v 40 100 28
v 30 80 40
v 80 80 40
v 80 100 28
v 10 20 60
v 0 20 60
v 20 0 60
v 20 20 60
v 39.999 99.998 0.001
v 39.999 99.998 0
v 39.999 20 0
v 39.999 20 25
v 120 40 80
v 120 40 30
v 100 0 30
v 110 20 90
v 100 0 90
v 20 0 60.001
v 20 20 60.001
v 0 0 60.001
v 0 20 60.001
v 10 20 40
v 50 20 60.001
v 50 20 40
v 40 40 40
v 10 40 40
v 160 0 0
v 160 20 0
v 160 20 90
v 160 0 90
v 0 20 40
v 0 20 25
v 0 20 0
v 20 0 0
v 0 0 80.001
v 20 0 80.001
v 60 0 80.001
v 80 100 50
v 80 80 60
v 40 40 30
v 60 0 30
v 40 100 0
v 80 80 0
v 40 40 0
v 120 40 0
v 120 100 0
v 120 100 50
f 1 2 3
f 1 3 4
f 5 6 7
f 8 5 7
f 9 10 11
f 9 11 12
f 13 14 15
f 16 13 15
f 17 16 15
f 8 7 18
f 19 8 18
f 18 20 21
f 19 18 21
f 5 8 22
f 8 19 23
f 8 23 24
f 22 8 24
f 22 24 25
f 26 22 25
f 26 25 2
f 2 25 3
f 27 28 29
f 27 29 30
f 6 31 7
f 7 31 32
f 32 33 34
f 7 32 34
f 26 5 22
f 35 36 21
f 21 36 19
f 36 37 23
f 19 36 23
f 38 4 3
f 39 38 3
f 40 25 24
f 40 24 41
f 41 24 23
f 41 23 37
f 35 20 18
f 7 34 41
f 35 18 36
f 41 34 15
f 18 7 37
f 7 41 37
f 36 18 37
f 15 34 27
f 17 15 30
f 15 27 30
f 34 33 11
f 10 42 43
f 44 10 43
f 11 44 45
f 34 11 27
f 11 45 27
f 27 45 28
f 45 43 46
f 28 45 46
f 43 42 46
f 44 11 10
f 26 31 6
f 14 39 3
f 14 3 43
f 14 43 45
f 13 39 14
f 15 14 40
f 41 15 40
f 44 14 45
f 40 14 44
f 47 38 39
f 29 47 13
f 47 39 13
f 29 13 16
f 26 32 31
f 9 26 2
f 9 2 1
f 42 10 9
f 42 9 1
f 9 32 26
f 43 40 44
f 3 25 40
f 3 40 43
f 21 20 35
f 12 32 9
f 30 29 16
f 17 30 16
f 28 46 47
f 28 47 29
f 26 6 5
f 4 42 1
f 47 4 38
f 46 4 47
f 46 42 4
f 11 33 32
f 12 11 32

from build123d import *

# Parameters (mm, degrees)
BOSS_EXTRUDE1_DEPTH  = 90
CUT_EXTRUDE1_DEPTH   = 251
CUT_EXTRUDE7_DEPTH   = 40
CUT_EXTRUDE8_DEPTH   = 20
SKETCH9_W            = 70
SKETCH9_H            = 10
CUT_EXTRUDE9_DEPTH   = 190
SKETCH10_W           = 39.999
SKETCH10_H           = 29.999
CUT_EXTRUDE13_DEPTH  = 190
CUT_EXTRUDE14_DEPTH  = 190
CUT_EXTRUDE15_DEPTH  = 190
BOSS_EXTRUDE2_DEPTH  = 34
SKETCH14_W           = 39.999
SKETCH14_H           = 20
BOSS_EXTRUDE3_DEPTH  = 34
BOSS_EXTRUDE4_DEPTH  = 34
CUT_EXTRUDE21_DEPTH  = 77
SKETCH21_W           = 43.001
SKETCH21_H           = 20
CUT_EXTRUDE26_DEPTH  = 77
SKETCH22_W           = 28.284271247
SKETCH22_H           = 44.001
CUT_EXTRUDE27_DEPTH  = 77
BOSS_EXTRUDE5_DEPTH  = 77
BOSS_EXTRUDE7_DEPTH  = 50
BOSS_EXTRUDE8_DEPTH  = 50
BOSS_EXTRUDE12_DEPTH = 50
SKETCH32_W           = 44.001
SKETCH32_H           = 44.77461291
CUT_EXTRUDE29_DEPTH  = 2
CUT_EXTRUDE30_DEPTH  = 26
CUT_EXTRUDE33_DEPTH  = 26
CUT_EXTRUDE34_DEPTH  = 26
CUT_EXTRUDE38_DEPTH  = 5
SKETCH39_W           = 17.510737787
SKETCH39_H           = 5.1178381
BOSS_EXTRUDE13_DEPTH = 5
BOSS_EXTRUDE14_DEPTH = 5
SKETCH41_W           = 36.425905646
SKETCH41_H           = 30.361438292
BOSS_EXTRUDE17_DEPTH = 5
SKETCH43_W           = 4
SKETCH43_H           = 20
CUT_EXTRUDE39_DEPTH  = 64
SKETCH44_W           = 50
SKETCH44_H           = 4
CUT_EXTRUDE40_DEPTH  = 64
SKETCH45_W           = 120
SKETCH45_H           = 89.443166314
CUT_EXTRUDE43_DEPTH  = 64
SKETCH47_W           = 22.113315132
SKETCH47_H           = 22.285790595
BOSS_EXTRUDE19_DEPTH = 2
SKETCH48_W           = 120
SKETCH48_H           = 89.4427191
CUT_EXTRUDE44_DEPTH  = 5
CUT_EXTRUDE47_DEPTH  = 5
BOSS_EXTRUDE24_DEPTH = 30
BOSS_EXTRUDE26_DEPTH = 30
SKETCH56_W           = 32.299156512
SKETCH56_H           = 27.21956411
BOSS_EXTRUDE27_DEPTH = 30
SKETCH57_W           = 40.001
SKETCH57_H           = 25.586983612
BOSS_EXTRUDE28_DEPTH = 30
SKETCH61_W           = 48.915417123
SKETCH61_H           = 22.361126989
CUT_EXTRUDE55_DEPTH  = 20
BOSS_EXTRUDE30_DEPTH = 10
CUT_EXTRUDE56_DEPTH  = 79
CUT_EXTRUDE57_DEPTH  = 79
CUT_EXTRUDE58_DEPTH  = 79
CUT_EXTRUDE59_DEPTH  = 10
CUT_EXTRUDE64_DEPTH  = 20
BOSS_EXTRUDE32_DEPTH = 20
CUT_EXTRUDE65_DEPTH  = 49
SKETCH73_W           = 58.518906985
SKETCH73_H           = 24.994806596
CUT_EXTRUDE66_DEPTH  = 49
SKETCH75_W           = 20
SKETCH75_H           = 56.568542508
BOSS_EXTRUDE33_DEPTH = 2
CUT_EXTRUDE69_DEPTH  = 29
CUT_EXTRUDE70_DEPTH  = 29
CUT_EXTRUDE72_DEPTH  = 2
SKETCH81_W           = 8.58676876
SKETCH81_H           = 2.828391771
CUT_EXTRUDE73_DEPTH  = 2
SKETCH82_W           = 29.228045829
SKETCH82_H           = 21.594351677
CUT_EXTRUDE76_DEPTH  = 40
CUT_EXTRUDE77_DEPTH  = 20
CUT_EXTRUDE82_DEPTH  = 40
CUT_EXTRUDE84_DEPTH  = 39.999
CUT_EXTRUDE85_DEPTH  = 0.0001
BOSS_EXTRUDE34_DEPTH = 2
CUT_EXTRUDE86_DEPTH  = 2
CUT_EXTRUDE88_DEPTH  = 56
BOSS_EXTRUDE40_DEPTH = 20
CUT_EXTRUDE89_DEPTH  = 20
BOSS_EXTRUDE41_DEPTH = 50
BOSS_EXTRUDE42_DEPTH = 40
BOSS_EXTRUDE43_DEPTH = 20
SKETCH102_W          = 60.001499975
SKETCH102_H          = 20
CUT_EXTRUDE90_DEPTH  = 20
BOSS_EXTRUDE44_DEPTH = 60
CUT_EXTRUDE91_DEPTH  = 60
CUT_EXTRUDE92_DEPTH  = 60
CUT_EXTRUDE93_DEPTH  = 10
CUT_EXTRUDE96_DEPTH  = 20
CUT_EXTRUDE98_DEPTH  = 20
BOSS_EXTRUDE45_DEPTH = 20
CUT_EXTRUDE99_DEPTH  = 20
CUT_EXTRUDE100_DEPTH = 10
CUT_EXTRUDE101_DEPTH = 142
CUT_EXTRUDE106_DEPTH = 39.999
CUT_EXTRUDE107_DEPTH = 10


with BuildPart() as part:
    # Sketch1 → Boss-Extrude1 (new body)
    with BuildSketch(Plane.XY):
        Polygon((0, 0), (0, 20), (40, 100), (120, 100), (160, 20), (160, 0), align=None)
    extrude(amount=BOSS_EXTRUDE1_DEPTH)

    # Sketch2 → Cut-Extrude1 (cut)
    with BuildSketch(Plane(origin=(0, 0, 0), x_dir=(0, 0, -1), z_dir=(1, 0, 0))):
        Polygon((-90, 100), (-50, 100), (-90, 20), align=None)
    extrude(amount=CUT_EXTRUDE1_DEPTH, mode=Mode.SUBTRACT)

    # Sketch7 → Cut-Extrude7 (cut)
    with BuildSketch(Plane.XY.offset(90)):
        Polygon((60, 0), (100, 0), (120, 40), (80, 80), (40, 40), align=None)
    extrude(amount=-CUT_EXTRUDE7_DEPTH, mode=Mode.SUBTRACT)

    # Sketch8 → Cut-Extrude8 (cut)
    with BuildSketch(Plane.XY.offset(50)):
        Polygon((40, 40), (120, 40), (80, 80), align=None)
    extrude(amount=-CUT_EXTRUDE8_DEPTH, mode=Mode.SUBTRACT)

    # Sketch9 → Cut-Extrude9 (cut)
    with BuildSketch(Plane(origin=(0, 0, 0), x_dir=(1, 0, 0), z_dir=(0, 1, 0))):
        with Locations((75, -85)):
            Rectangle(SKETCH9_W, SKETCH9_H)
    extrude(amount=CUT_EXTRUDE9_DEPTH, mode=Mode.SUBTRACT)

    # Sketch10 → Cut-Extrude13 (cut)
    with BuildSketch(Plane(origin=(0, 0, 0), x_dir=(-1, 0, 0), z_dir=(0, -1, 0))):
        with Locations((-19.9995, -75.0005)):
            Rectangle(SKETCH10_W, SKETCH10_H)
    extrude(amount=-CUT_EXTRUDE13_DEPTH, mode=Mode.SUBTRACT)

    # Sketch11 → Cut-Extrude14 (cut)
    with BuildSketch(Plane(origin=(40, 0, 0), x_dir=(0, 0, -1), z_dir=(1, 0, 0))):
        Polygon((-80, 40), (-80, 0), (-90, 0), (-90, 20), align=None)
    extrude(amount=-CUT_EXTRUDE14_DEPTH, mode=Mode.SUBTRACT)

    # Sketch12 → Cut-Extrude15 (cut)
    with BuildSketch(Plane(origin=(0, 0, 0), x_dir=(-1, 0, 0), z_dir=(0, -1, 0))):
        Polygon((-100, -80), (-100, -70), (-110, -75), (-110, -80), align=None)
        Polygon((-39.999, -80), (-60, -80), (-60, -70), align=None)
    extrude(amount=-CUT_EXTRUDE15_DEPTH, mode=Mode.SUBTRACT)

    # Sketch13 → Boss-Extrude2 (add)
    with BuildSketch(Plane.XY.offset(90)):
        Polygon((110, 20), (110, 0), (100, 0), align=None)
    extrude(amount=-BOSS_EXTRUDE2_DEPTH)

    # Sketch14 → Boss-Extrude3 (add)
    with BuildSketch(Plane.XY.offset(60.001)):
        with Locations((19.9995, 10)):
            Rectangle(SKETCH14_W, SKETCH14_H)
    extrude(amount=BOSS_EXTRUDE3_DEPTH)

    # Sketch15 → Boss-Extrude4 (add)
    with BuildSketch(Plane.XY.offset(94.001)):
        Polygon((39.999, 0), (60, 0), (39.999, 20), align=None)
    extrude(amount=-BOSS_EXTRUDE4_DEPTH)

    # Sketch17 → Cut-Extrude21 (cut)
    with BuildSketch(Plane.XY.offset(50)):
        Polygon((60, 0), (40, 40), (40, 20), align=None)
    extrude(amount=CUT_EXTRUDE21_DEPTH, mode=Mode.SUBTRACT)

    # Sketch21 → Cut-Extrude26 (cut)
    with BuildSketch(Plane(origin=(40, 0, 0), x_dir=(0, 0, -1), z_dir=(1, 0, 0))):
        with Locations((-71.5005, 30)):
            Rectangle(SKETCH21_W, SKETCH21_H)
    extrude(amount=-CUT_EXTRUDE26_DEPTH, mode=Mode.SUBTRACT)

    # Sketch22 → Cut-Extrude27 (cut)
    with BuildSketch(Plane(origin=(30, 30, 0), x_dir=(0.707106781, -0.707106781, 0), z_dir=(0.707106781, 0.707106781, 0))):
        with Locations((28.284271248, -72.0005)):
            Rectangle(SKETCH22_W, SKETCH22_H)
    extrude(amount=-CUT_EXTRUDE27_DEPTH, mode=Mode.SUBTRACT)

    # Sketch23 → Boss-Extrude5 (add)
    with BuildSketch(Plane.XY.offset(94.001)):
        Polygon((39.999, 19.999), (39.999, 0), (49.999, 0), (39.999333333, 19.999333333), align=None)
        Polygon((39.999, 19.999), (20, 0), (39.999, 0), align=None)
    extrude(amount=-BOSS_EXTRUDE5_DEPTH)

    # Sketch26 → Boss-Extrude7 (add)
    with BuildSketch(Plane(origin=(0, 44.338879347, 80.614312123), x_dir=(-1, 0, 0), z_dir=(0, -0.481927159, -0.876211284))):
        Polygon((-40, 63.524770438), (-39.999, -27.777409169), (0, -27.777409169), align=None)
    extrude(amount=BOSS_EXTRUDE7_DEPTH)

    # Sketch28 → Boss-Extrude8 (add)
    with BuildSketch(Plane.XY.offset(94.001)):
        Polygon((0, 0), (60, 0), (50, 20), (0, 20), align=None)
    extrude(amount=-BOSS_EXTRUDE8_DEPTH)

    # Sketch31 → Boss-Extrude12 (add)
    with BuildSketch(Plane.XY.offset(94.001)):
        Polygon((50, 20), (40.001, 40), (39.999, 20), align=None)
    extrude(amount=-BOSS_EXTRUDE12_DEPTH)

    # Sketch32 → Cut-Extrude29 (cut)
    with BuildSketch(Plane(origin=(48, 24, 0), x_dir=(0, 0, -1), z_dir=(0.894427191, 0.447213595, 0))):
        with Locations((-72.0005, -4.445509275)):
            Rectangle(SKETCH32_W, SKETCH32_H)
    extrude(amount=CUT_EXTRUDE29_DEPTH, mode=Mode.SUBTRACT)

    # Sketch33 → Cut-Extrude30 (cut)
    with BuildSketch(Plane.XZ):
        Polygon((0, 57.638190064), (2.048178967, 47.937387746), (39.999051204, 47.937387746), (39.999, 57.638190064), align=None)
    extrude(amount=CUT_EXTRUDE30_DEPTH, mode=Mode.SUBTRACT)

    # Sketch35 → Cut-Extrude33 (cut)
    with BuildSketch(Plane(origin=(11.650101548, 0, 2.459744274), x_dir=(0.206580732, 0, -0.978429559), z_dir=(0.978429559, 0, 0.206580732))):
        Polygon((-48.782961552, -4.096357934), (-56.394908865, 0), (-46.480242824, 0), align=None)
    extrude(amount=-CUT_EXTRUDE33_DEPTH, mode=Mode.SUBTRACT)

    # Sketch36 → Cut-Extrude34 (cut)
    with BuildSketch(Plane(origin=(2.063610836, 42.293706667, 82.523802497), x_dir=(0.999752475, -0.01014732, -0.019799527), z_dir=(0.022248357, 0.455980099, 0.889711841))):
        Polygon((117.965588634, 66.188562504), (37.965588634, 66.188562504), (-2.064121759, -25.074555041), (157.975492098, -23.249726974), align=None)
    extrude(amount=CUT_EXTRUDE34_DEPTH, mode=Mode.SUBTRACT)

    # Sketch38 → Cut-Extrude38 (cut)
    with BuildSketch(Plane(origin=(0, -24.338879347, 13.386687877), x_dir=(-1, 0, 0), z_dir=(0, -0.876211284, 0.481927159))):
        Polygon((0, -42.003280055), (-1.572481647, -42.003280055), (0, -50.503232507), align=None)
    extrude(amount=-CUT_EXTRUDE38_DEPTH, mode=Mode.SUBTRACT)

    # Sketch39 → Boss-Extrude13 (add)
    with BuildSketch(Plane.ZY):
        with Locations((54.561477416, 2.55891905)):
            Rectangle(SKETCH39_W, SKETCH39_H)
    extrude(amount=-BOSS_EXTRUDE13_DEPTH)

    # Sketch40 → Boss-Extrude14 (add)
    with BuildSketch(Plane(origin=(-8, 4, 0), x_dir=(0, 0, 1), z_dir=(-0.894427191, 0.447213595, 0))):
        Polygon((60.001, 84.968347077), (50, 17.88854382), (94.001, 17.88854382), align=None)
    extrude(amount=-BOSS_EXTRUDE14_DEPTH)

    # Sketch41 → Boss-Extrude17 (add)
    with BuildSketch(Plane(origin=(-8, 4, 0), x_dir=(0, 0, 1), z_dir=(-0.894427191, 0.447213595, 0))):
        with Locations((48.733378767, 33.069262966)):
            Rectangle(SKETCH41_W, SKETCH41_H)
    extrude(amount=-BOSS_EXTRUDE17_DEPTH)

    # Sketch43 → Cut-Extrude39 (cut)
    with BuildSketch(Plane.ZY):
        with Locations((92.001, 10)):
            Rectangle(SKETCH43_W, SKETCH43_H)
    extrude(amount=-CUT_EXTRUDE39_DEPTH, mode=Mode.SUBTRACT)

    # Sketch44 → Cut-Extrude40 (cut)
    with BuildSketch(Plane.XZ.offset(-20)):
        with Locations((25, 92.001)):
            Rectangle(SKETCH44_W, SKETCH44_H)
    extrude(amount=-CUT_EXTRUDE40_DEPTH, mode=Mode.SUBTRACT)

    # Sketch45 → Cut-Extrude43 (cut)
    with BuildSketch(Plane(origin=(0, 40, 80), x_dir=(1, 0, 0), z_dir=(0, 0.447213595, 0.894427191))):
        with Locations((60, 22.360456168)):
            Rectangle(SKETCH45_W, SKETCH45_H)
    extrude(amount=CUT_EXTRUDE43_DEPTH, mode=Mode.SUBTRACT)

    # Sketch47 → Boss-Extrude19 (add)
    with BuildSketch(Plane(origin=(0, 40, 80), x_dir=(1, 0, 0), z_dir=(0, 0.447213595, 0.894427191))):
        with Locations((51.032841939, -11.089641938)):
            Rectangle(SKETCH47_W, SKETCH47_H)
    extrude(amount=BOSS_EXTRUDE19_DEPTH)

    # Sketch48 → Cut-Extrude44 (cut)
    with BuildSketch(Plane(origin=(0, 40, 80), x_dir=(1, 0, 0), z_dir=(0, 0.447213595, 0.894427191))):
        with Locations((60, 22.360679775)):
            Rectangle(SKETCH48_W, SKETCH48_H)
    extrude(amount=CUT_EXTRUDE44_DEPTH, mode=Mode.SUBTRACT)

    # Sketch49 → Cut-Extrude47 (cut)
    with BuildSketch(Plane(origin=(0, 40, 80), x_dir=(1, 0, 0), z_dir=(0, 0.447213595, 0.894427191))):
        Polygon((40.0009998, -0.002235621), (39.999024063, -22.091645582), (50.0002, -22.361126989), align=None)
    extrude(amount=-CUT_EXTRUDE47_DEPTH, mode=Mode.SUBTRACT)

    # Sketch52 → Boss-Extrude24 (add)
    with BuildSketch(Plane.XY.offset(50)):
        Polygon((40.119078133, 40.119078133), (39.976184373, 40.047631253), (39.99942419, 40), align=None)
    extrude(amount=BOSS_EXTRUDE24_DEPTH)

    # Sketch53 → Boss-Extrude26 (add)
    with BuildSketch(Plane(origin=(0, 40, 80), x_dir=(1, 0, 0), z_dir=(0, 0.447213595, 0.894427191))):
        Polygon((39.999265842, 0.000297206), (39.999024063, -22.091645582), (50.0002, -22.361126989), align=None)
    extrude(amount=-BOSS_EXTRUDE26_DEPTH)

    # Sketch56 → Boss-Extrude27 (add)
    with BuildSketch(Plane(origin=(-8, 4, 0), x_dir=(0, 0, 1), z_dir=(-0.894427191, 0.447213595, 0))):
        with Locations((56.525769836, 33.806547561)):
            Rectangle(SKETCH56_W, SKETCH56_H)
    extrude(amount=-BOSS_EXTRUDE27_DEPTH)

    # Sketch57 → Boss-Extrude28 (add)
    with BuildSketch(Plane(origin=(48, 24, 0), x_dir=(0, 0, -1), z_dir=(0.894427191, 0.447213595, 0))):
        with Locations((-70.0005, 5.095479818)):
            Rectangle(SKETCH57_W, SKETCH57_H)
    extrude(amount=-BOSS_EXTRUDE28_DEPTH)

    # Sketch61 → Cut-Extrude55 (cut)
    with BuildSketch(Plane(origin=(0, 40, 80), x_dir=(1, 0, 0), z_dir=(0, 0.447213595, 0.894427191))):
        with Locations((34.457708561, -11.180563495)):
            Rectangle(SKETCH61_W, SKETCH61_H)
    extrude(amount=CUT_EXTRUDE55_DEPTH, mode=Mode.SUBTRACT)

    # Sketch62 → Boss-Extrude30 (add)
    with BuildSketch(Plane.XY.offset(30)):
        Polygon((80, 80), (40, 40), (120, 40), align=None)
    extrude(amount=BOSS_EXTRUDE30_DEPTH)

    # Sketch63 → Cut-Extrude56 (cut)
    with BuildSketch(Plane.XY.offset(40)):
        Polygon((80, 100), (40, 100), (0, 20), (40, 40), (80, 80), align=None)
        Polygon((0, 20), (50, 20), (40, 40), align=None)
    extrude(amount=CUT_EXTRUDE56_DEPTH, mode=Mode.SUBTRACT)

    # Sketch64 → Cut-Extrude57 (cut)
    with BuildSketch(Plane(origin=(0, 0, 0), x_dir=(0, 0, -1), z_dir=(1, 0, 0))):
        Polygon((-60, 80), (-40, 80), (-28, 100), (-50, 100), align=None)
    extrude(amount=CUT_EXTRUDE57_DEPTH, mode=Mode.SUBTRACT)

    # Sketch65 → Cut-Extrude58 (cut)
    with BuildSketch(Plane.ZY.offset(-80)):
        Polygon((40, 100), (28, 100), (40, 80), align=None)
    extrude(amount=CUT_EXTRUDE58_DEPTH, mode=Mode.SUBTRACT)

    # Sketch66 → Cut-Extrude59 (cut)
    with BuildSketch(Plane.XY.offset(50)):
        Polygon((40, 40), (120, 40), (100, 0), (60, 0), align=None)
    extrude(amount=-CUT_EXTRUDE59_DEPTH, mode=Mode.SUBTRACT)

    # Sketch67 → Cut-Extrude64 (cut)
    with BuildSketch(Plane(origin=(0, 0, 0), x_dir=(0, 0, -1), z_dir=(1, 0, 0))):
        Polygon((-80.001, 0), (-90.001, 0), (-90.001, 20), (-80, 40.002), (-40, 40.002), align=None)
    extrude(amount=CUT_EXTRUDE64_DEPTH, mode=Mode.SUBTRACT)

    # Sketch71 → Boss-Extrude32 (add)
    with BuildSketch(Plane.ZY):
        Polygon((60.001499975, 20), (40, 40), (40, 20), align=None)
    extrude(amount=-BOSS_EXTRUDE32_DEPTH)

    # Sketch72 → Cut-Extrude65 (cut)
    with BuildSketch(Plane.ZY.offset(-20)):
        Polygon((60.001499975, 20), (80.001, 0), (90.001, 0), (90, 20), align=None)
    extrude(amount=-CUT_EXTRUDE65_DEPTH, mode=Mode.SUBTRACT)

    # Sketch73 → Cut-Extrude66 (cut)
    with BuildSketch(Plane(origin=(0, 0.00450005, 90.000999775), x_dir=(-1, 0, 0), z_dir=(0, -5e-05, -0.999999999))):
        with Locations((-49.259453493, 7.498096677)):
            Rectangle(SKETCH73_W, SKETCH73_H)
    extrude(amount=-CUT_EXTRUDE66_DEPTH, mode=Mode.SUBTRACT)

    # Sketch75 → Boss-Extrude33 (add)
    with BuildSketch(Plane(origin=(0, 40.000499988, 40.001499975), x_dir=(1, 0, 0), z_dir=(0, 0.707097943, 0.70711562))):
        with Locations((10, -28.284271254)):
            Rectangle(SKETCH75_W, SKETCH75_H)
    extrude(amount=-BOSS_EXTRUDE33_DEPTH)

    # Sketch77 → Cut-Extrude69 (cut)
    with BuildSketch(Plane.ZY):
        Polygon((77.172608229, 0), (80.001, 0), (78.586768761, -1.414195885), align=None)
    extrude(amount=-CUT_EXTRUDE69_DEPTH, mode=Mode.SUBTRACT)

    # Sketch78 → Cut-Extrude70 (cut)
    with BuildSketch(Plane(origin=(0, 0, 40), x_dir=(-1, 0, 0), z_dir=(0, 0, -1))):
        Polygon((0, 20), (-8.58676876, 37.173537521), (0, 37.173537521), align=None)
    extrude(amount=-CUT_EXTRUDE70_DEPTH, mode=Mode.SUBTRACT)

    # Sketch80 → Cut-Extrude72 (cut)
    with BuildSketch(Plane(origin=(0, 38.586304102, 38.587268736), x_dir=(-1, 0, 0), z_dir=(0, -0.707097943, -0.70711562))):
        Polygon((-9.293152051, 0), (0, 0), (0, -1.997928687), (-8.58676876, -1.997928687), align=None)
    extrude(amount=-CUT_EXTRUDE72_DEPTH, mode=Mode.SUBTRACT)

    # Sketch81 → Cut-Extrude73 (cut)
    with BuildSketch(Plane.XZ.offset(-37.173537521)):
        with Locations((4.29338438, 41.414195885)):
            Rectangle(SKETCH81_W, SKETCH81_H)
    extrude(amount=-CUT_EXTRUDE73_DEPTH, mode=Mode.SUBTRACT)

    # Sketch82 → Cut-Extrude76 (cut)
    with BuildSketch(Plane(origin=(-8, 4, 0), x_dir=(0, 0, 1), z_dir=(-0.894427191, 0.447213595, 0))):
        with Locations((38.699840788, 41.014077253)):
            Rectangle(SKETCH82_W, SKETCH82_H)
    extrude(amount=CUT_EXTRUDE76_DEPTH, mode=Mode.SUBTRACT)

    # Sketch83 → Cut-Extrude77 (cut)
    with BuildSketch(Plane.ZY):
        Polygon((60.001499975, 20), (60.001499975, 0), (80.001, 0), align=None)
    extrude(amount=-CUT_EXTRUDE77_DEPTH, mode=Mode.SUBTRACT)

    # Sketch86 → Cut-Extrude82 (cut)
    with BuildSketch(Plane.XY.offset(40)):
        Polygon((80, 80), (120, 40), (40, 40), align=None)
    extrude(amount=-CUT_EXTRUDE82_DEPTH, mode=Mode.SUBTRACT)

    # Sketch87 → Cut-Extrude84 (cut)
    with BuildSketch(Plane(origin=(0, 0, 0), x_dir=(0, 0, -1), z_dir=(1, 0, 0))):
        Polygon((0, 20), (-25, 20), (0, 100), align=None)
    extrude(amount=CUT_EXTRUDE84_DEPTH, mode=Mode.SUBTRACT)

    # Sketch89 → Cut-Extrude85 (cut)
    with BuildSketch(Plane.ZY.offset(-39.999)):
        Polygon((0, 20), (25, 20), (0, 99.998), align=None)
    extrude(amount=-CUT_EXTRUDE85_DEPTH, mode=Mode.SUBTRACT)

    # Sketch90 → Boss-Extrude34 (add)
    with BuildSketch(Plane.ZY.offset(-39.9991)):
        Polygon((25, 20), (0, 99.998), (0, 20), align=None)
    extrude(amount=BOSS_EXTRUDE34_DEPTH)

    # Sketch91 → Cut-Extrude86 (cut)
    with BuildSketch(Plane.ZY.offset(-37.9991)):
        Polygon((0, 99.998), (0, 20), (25, 20), align=None)
    extrude(amount=-CUT_EXTRUDE86_DEPTH, mode=Mode.SUBTRACT)

    # Sketch95 → Cut-Extrude88 (cut)
    with BuildSketch(Plane(origin=(0, 0, 0), x_dir=(-1, 0, 0), z_dir=(0, 0, -1))):
        Polygon((-80, 100), (-80, 80), (-40, 40), (-50, 20), (0, 20), (-39.9991, 100), align=None)
    extrude(amount=-CUT_EXTRUDE88_DEPTH, mode=Mode.SUBTRACT)

    # Sketch96 → Boss-Extrude40 (add)
    with BuildSketch(Plane.XY.offset(40)):
        Polygon((40, 40), (120, 40), (100, 0), (60, 0), align=None)
    extrude(amount=BOSS_EXTRUDE40_DEPTH)

    # Sketch97 → Cut-Extrude89 (cut)
    with BuildSketch(Plane(origin=(0, 0, 56), x_dir=(-1, 0, 0), z_dir=(0, 0, -1))):
        Polygon((-20, 24.00160001), (-2.000800005, 24.00160001), (0, 20), (-20, 20), align=None)
    extrude(amount=-CUT_EXTRUDE89_DEPTH, mode=Mode.SUBTRACT)

    # Sketch98 → Boss-Extrude41 (add)
    with BuildSketch(Plane(origin=(0, 0, 0), x_dir=(-1, 0, 0), z_dir=(0, 0, -1))):
        Polygon((-80, 80), (-120, 40), (-40, 40), align=None)
    extrude(amount=-BOSS_EXTRUDE41_DEPTH)

    # Sketch99 → Boss-Extrude42 (add)
    with BuildSketch(Plane(origin=(0, 0, 0), x_dir=(-1, 0, 0), z_dir=(0, 0, -1))):
        Polygon((0, 20), (-40, 100), (-80, 100), (-80, 80), (-40, 40), (-50, 20), align=None)
    extrude(amount=-BOSS_EXTRUDE42_DEPTH)

    # Sketch100 → Boss-Extrude43 (add)
    with BuildSketch(Plane.ZY.offset(-20)):
        Polygon((60.001499975, 20), (60.001499975, 0), (80.001, 0), align=None)
    extrude(amount=BOSS_EXTRUDE43_DEPTH)

    # Sketch102 → Cut-Extrude90 (cut)
    with BuildSketch(Plane.ZY):
        with Locations((30.000749988, 10)):
            Rectangle(SKETCH102_W, SKETCH102_H)
    extrude(amount=-CUT_EXTRUDE90_DEPTH, mode=Mode.SUBTRACT)

    # Sketch103 → Boss-Extrude44 (add)
    with BuildSketch(Plane(origin=(0, 0, 0), x_dir=(-1, 0, 0), z_dir=(0, 0, -1))):
        Polygon((0, 20), (-20, 0), (-20, 20), align=None)
    extrude(amount=-BOSS_EXTRUDE44_DEPTH)

    # Sketch105 → Cut-Extrude91 (cut)
    with BuildSketch(Plane(origin=(80, 0, 0), x_dir=(0, 0, -1), z_dir=(1, 0, 0))):
        Polygon((-60, 80), (-40, 80), (-28, 100), (-50, 100), align=None)
    extrude(amount=-CUT_EXTRUDE91_DEPTH, mode=Mode.SUBTRACT)

    # Sketch106 → Cut-Extrude92 (cut)
    with BuildSketch(Plane.ZY.offset(-80)):
        Polygon((60, 80), (40, 80), (40, 40), (80, 40), align=None)
    extrude(amount=CUT_EXTRUDE92_DEPTH, mode=Mode.SUBTRACT)

    # Sketch107 → Cut-Extrude93 (cut)
    with BuildSketch(Plane.XY.offset(50)):
        Polygon((120, 40), (80, 40), (80, 80), align=None)
    extrude(amount=-CUT_EXTRUDE93_DEPTH, mode=Mode.SUBTRACT)

    # Sketch109 → Cut-Extrude96 (cut)
    with BuildSketch(Plane.XY.offset(60)):
        Polygon((50, 20), (50, 40), (40, 40), align=None)
    extrude(amount=-CUT_EXTRUDE96_DEPTH, mode=Mode.SUBTRACT)

    # Sketch111 → Cut-Extrude98 (cut)
    with BuildSketch(Plane.XY.offset(60)):
        Polygon((120, 40), (50, 40), (50, 20), (60, 0), (100, 0), align=None)
    extrude(amount=-CUT_EXTRUDE98_DEPTH, mode=Mode.SUBTRACT)

    # Sketch112 → Boss-Extrude45 (add)
    with BuildSketch(Plane(origin=(0, 0, 0), x_dir=(0, 0, -1), z_dir=(1, 0, 0))):
        Polygon((-60, 20), (-40, 39.999500025), (-40, 20), align=None)
    extrude(amount=BOSS_EXTRUDE45_DEPTH)

    # Sketch113 → Cut-Extrude99 (cut)
    with BuildSketch(Plane(origin=(0, 0, 40), x_dir=(-1, 0, 0), z_dir=(0, 0, -1))):
        Polygon((-9.999750012, 39.999500025), (0, 39.999500025), (0, 20), align=None)
    extrude(amount=-CUT_EXTRUDE99_DEPTH, mode=Mode.SUBTRACT)

    # Sketch114 → Cut-Extrude100 (cut)
    with BuildSketch(Plane(origin=(20, 0, 0), x_dir=(0, 0, -1), z_dir=(1, 0, 0))):
        Polygon((-40, 39.999500025), (-60.001499975, 20), (-40, 20), align=None)
    extrude(amount=-CUT_EXTRUDE100_DEPTH, mode=Mode.SUBTRACT)

    # Sketch115 → Cut-Extrude101 (cut)
    with BuildSketch(Plane.XY.offset(40)):
        Polygon((80, 80), (120, 40), (40, 40), align=None)
    extrude(amount=-CUT_EXTRUDE101_DEPTH, mode=Mode.SUBTRACT)

    # Sketch117 → Cut-Extrude106 (cut)
    with BuildSketch(Plane(origin=(0, 0, 0), x_dir=(0, 0, -1), z_dir=(1, 0, 0))):
        Polygon((0, 20), (-25, 20), (0, 100), align=None)
    extrude(amount=CUT_EXTRUDE106_DEPTH, mode=Mode.SUBTRACT)

    # Sketch118 → Cut-Extrude107 (cut)
    with BuildSketch(Plane.XY.offset(40)):
        Polygon((40, 40), (120, 40), (100, 0), (60, 0), align=None)
    extrude(amount=-CUT_EXTRUDE107_DEPTH, mode=Mode.SUBTRACT)


solid = part.part
